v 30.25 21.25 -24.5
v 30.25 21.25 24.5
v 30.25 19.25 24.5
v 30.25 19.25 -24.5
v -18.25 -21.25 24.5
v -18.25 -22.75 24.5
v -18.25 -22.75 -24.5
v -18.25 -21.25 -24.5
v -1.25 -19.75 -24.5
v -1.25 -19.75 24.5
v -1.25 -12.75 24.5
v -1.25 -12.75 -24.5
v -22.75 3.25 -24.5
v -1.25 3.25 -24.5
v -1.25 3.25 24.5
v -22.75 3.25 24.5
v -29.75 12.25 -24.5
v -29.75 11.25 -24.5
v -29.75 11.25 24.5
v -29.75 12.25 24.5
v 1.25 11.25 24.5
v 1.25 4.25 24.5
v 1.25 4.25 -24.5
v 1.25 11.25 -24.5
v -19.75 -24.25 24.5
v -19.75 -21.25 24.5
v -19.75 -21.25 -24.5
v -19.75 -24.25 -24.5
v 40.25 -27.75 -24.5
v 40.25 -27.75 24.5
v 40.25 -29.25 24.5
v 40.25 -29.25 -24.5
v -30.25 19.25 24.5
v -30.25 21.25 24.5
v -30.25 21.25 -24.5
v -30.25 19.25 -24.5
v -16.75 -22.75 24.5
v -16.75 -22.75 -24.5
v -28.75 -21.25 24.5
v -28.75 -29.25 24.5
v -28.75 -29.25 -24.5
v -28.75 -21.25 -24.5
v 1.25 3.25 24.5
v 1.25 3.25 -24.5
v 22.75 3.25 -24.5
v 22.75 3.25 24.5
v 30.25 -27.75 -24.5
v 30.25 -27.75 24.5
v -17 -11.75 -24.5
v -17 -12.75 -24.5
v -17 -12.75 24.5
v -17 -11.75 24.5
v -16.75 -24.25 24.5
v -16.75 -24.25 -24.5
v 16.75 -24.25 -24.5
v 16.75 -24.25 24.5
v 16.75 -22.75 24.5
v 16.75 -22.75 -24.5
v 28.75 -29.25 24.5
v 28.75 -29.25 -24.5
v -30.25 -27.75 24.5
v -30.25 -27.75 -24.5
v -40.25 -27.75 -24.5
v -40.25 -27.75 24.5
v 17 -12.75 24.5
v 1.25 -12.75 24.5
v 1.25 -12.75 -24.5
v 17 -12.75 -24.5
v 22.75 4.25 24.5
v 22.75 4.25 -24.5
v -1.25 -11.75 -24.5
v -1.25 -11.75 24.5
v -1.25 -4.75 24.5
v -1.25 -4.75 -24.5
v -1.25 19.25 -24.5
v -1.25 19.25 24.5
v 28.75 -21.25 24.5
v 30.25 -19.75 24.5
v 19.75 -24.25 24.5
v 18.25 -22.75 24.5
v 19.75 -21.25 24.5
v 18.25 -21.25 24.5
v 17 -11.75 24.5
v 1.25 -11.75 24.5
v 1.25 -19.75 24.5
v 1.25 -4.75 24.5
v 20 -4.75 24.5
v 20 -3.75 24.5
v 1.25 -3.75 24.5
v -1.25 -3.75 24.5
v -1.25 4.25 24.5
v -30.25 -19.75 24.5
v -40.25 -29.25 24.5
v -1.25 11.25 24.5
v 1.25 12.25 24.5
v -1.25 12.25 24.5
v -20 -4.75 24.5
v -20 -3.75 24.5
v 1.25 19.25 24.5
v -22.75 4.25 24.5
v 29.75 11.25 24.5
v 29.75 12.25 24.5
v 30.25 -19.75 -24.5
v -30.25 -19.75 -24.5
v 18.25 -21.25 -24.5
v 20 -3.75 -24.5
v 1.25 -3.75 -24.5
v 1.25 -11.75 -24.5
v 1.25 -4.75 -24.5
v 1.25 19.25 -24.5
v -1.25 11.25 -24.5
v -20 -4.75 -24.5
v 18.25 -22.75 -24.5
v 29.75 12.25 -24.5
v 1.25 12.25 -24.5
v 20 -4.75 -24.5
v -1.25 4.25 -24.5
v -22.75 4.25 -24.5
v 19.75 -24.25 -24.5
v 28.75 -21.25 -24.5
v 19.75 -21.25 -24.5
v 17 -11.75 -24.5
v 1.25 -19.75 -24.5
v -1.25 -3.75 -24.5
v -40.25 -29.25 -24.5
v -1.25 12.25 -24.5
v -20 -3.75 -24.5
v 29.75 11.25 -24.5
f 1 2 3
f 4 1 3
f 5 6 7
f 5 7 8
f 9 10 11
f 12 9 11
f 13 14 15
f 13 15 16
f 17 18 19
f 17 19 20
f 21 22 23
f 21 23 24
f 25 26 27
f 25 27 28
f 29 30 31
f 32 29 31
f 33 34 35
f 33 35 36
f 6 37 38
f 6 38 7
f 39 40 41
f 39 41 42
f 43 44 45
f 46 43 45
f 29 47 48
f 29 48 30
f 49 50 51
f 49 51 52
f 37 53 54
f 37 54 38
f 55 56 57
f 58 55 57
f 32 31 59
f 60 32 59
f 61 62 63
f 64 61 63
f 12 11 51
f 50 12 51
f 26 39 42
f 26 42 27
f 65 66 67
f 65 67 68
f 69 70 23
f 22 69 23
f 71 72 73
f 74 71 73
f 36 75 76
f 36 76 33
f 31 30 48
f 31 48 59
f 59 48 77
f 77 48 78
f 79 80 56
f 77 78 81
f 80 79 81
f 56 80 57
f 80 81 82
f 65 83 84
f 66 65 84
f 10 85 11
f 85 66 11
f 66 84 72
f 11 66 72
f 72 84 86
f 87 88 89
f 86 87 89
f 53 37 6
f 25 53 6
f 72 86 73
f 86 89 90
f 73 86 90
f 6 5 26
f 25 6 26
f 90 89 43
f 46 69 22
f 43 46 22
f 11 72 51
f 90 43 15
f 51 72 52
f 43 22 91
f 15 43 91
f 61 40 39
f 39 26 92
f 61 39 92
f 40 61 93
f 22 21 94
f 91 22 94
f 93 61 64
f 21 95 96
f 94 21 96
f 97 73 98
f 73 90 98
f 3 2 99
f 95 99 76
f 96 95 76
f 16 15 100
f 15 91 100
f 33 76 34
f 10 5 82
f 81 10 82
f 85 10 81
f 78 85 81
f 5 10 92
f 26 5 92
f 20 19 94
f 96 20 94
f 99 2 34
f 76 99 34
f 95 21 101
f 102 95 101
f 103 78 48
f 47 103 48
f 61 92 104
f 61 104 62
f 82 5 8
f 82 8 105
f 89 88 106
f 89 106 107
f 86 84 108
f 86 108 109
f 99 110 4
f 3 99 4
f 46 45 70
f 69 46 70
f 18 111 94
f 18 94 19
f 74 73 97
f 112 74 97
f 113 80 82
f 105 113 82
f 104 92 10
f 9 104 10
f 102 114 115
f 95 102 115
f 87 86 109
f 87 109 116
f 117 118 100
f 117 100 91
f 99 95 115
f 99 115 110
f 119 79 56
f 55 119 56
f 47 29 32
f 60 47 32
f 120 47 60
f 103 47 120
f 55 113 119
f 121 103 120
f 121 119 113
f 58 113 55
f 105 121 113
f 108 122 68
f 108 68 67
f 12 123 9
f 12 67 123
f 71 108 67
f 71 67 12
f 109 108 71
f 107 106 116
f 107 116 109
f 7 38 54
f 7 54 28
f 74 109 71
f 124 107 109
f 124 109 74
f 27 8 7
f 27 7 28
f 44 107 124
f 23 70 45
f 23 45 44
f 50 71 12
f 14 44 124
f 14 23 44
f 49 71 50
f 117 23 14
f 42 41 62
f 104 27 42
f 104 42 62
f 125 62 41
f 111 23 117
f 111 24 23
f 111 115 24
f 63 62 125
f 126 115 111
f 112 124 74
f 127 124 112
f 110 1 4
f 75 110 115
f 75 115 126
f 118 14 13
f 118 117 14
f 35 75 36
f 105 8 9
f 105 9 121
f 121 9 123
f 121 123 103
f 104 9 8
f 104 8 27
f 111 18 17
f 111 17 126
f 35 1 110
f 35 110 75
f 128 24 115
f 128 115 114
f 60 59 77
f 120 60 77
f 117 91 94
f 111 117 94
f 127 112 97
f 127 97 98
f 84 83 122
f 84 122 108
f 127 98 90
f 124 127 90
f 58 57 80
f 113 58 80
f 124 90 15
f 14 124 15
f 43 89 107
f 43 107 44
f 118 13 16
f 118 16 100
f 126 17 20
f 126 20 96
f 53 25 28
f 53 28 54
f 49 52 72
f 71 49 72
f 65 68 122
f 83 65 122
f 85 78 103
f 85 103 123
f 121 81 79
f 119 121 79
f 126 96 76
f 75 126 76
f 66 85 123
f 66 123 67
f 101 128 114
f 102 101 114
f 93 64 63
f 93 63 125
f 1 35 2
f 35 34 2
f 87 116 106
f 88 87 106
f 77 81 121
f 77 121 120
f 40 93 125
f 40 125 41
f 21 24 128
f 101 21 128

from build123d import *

# Parameters (mm, degrees)
SKETCH1_W           = 60.5
SKETCH1_H           = 42.5
BOSS_EXTRUDE1_DEPTH = 24.5
BOSS_EXTRUDE2_DEPTH = 49
CUT_EXTRUDE1_DEPTH  = 50


with BuildPart() as part:
    # Sketch1 → Boss-Extrude1 (new body, symmetric)
    with BuildSketch(Plane.XY):
        Rectangle(SKETCH1_W, SKETCH1_H)
    extrude(amount=BOSS_EXTRUDE1_DEPTH, both=True)

    # Sketch2 → Boss-Extrude2 (add)
    with BuildSketch(Plane.XY.offset(24.5)):
        Polygon((-30.25, -21.25), (-30.25, -27.75), (-40.25, -27.75), (-40.25, -29.25), (-28.75, -29.25), (-28.75, -21.25), align=None)
        Polygon((-19.75, -21.25), (-19.75, -24.25), (-16.75, -24.25), (-16.75, -22.75), (-18.25, -22.75), (-18.25, -21.25), align=None)
    boss_extrude2 = extrude(amount=-BOSS_EXTRUDE2_DEPTH)

    # Sketch3 → Cut-Extrude1 (cut, through all)
    with BuildSketch(Plane.XY.offset(24.5)):
        Polygon((-30.25, 19.25), (-30.25, -19.75), (-1.25, -19.75), (-1.25, -12.75), (-17, -12.75), (-17, -11.75), (-1.25, -11.75), (-1.25, -4.75), (-20, -4.75), (-20, -3.75), (-1.25, -3.75), (-1.25, 3.25), (-22.75, 3.25), (-22.75, 4.25), (-1.25, 4.25), (-1.25, 11.25), (-29.75, 11.25), (-29.75, 12.25), (-1.25, 12.25), (-1.25, 19.25), align=None)
    cut_extrude1 = extrude(amount=-CUT_EXTRUDE1_DEPTH, mode=Mode.SUBTRACT)

    # Mirror1: Boss-Extrude2, Cut-Extrude1 across plane
    add(boss_extrude2.mirror(Plane(origin=(0, 0, 0), x_dir=(0, 0, 1), z_dir=(1, 0, 0))))
    add(cut_extrude1.mirror(Plane(origin=(0, 0, 0), x_dir=(0, 0, 1), z_dir=(1, 0, 0))), mode=Mode.SUBTRACT)


solid = part.part
